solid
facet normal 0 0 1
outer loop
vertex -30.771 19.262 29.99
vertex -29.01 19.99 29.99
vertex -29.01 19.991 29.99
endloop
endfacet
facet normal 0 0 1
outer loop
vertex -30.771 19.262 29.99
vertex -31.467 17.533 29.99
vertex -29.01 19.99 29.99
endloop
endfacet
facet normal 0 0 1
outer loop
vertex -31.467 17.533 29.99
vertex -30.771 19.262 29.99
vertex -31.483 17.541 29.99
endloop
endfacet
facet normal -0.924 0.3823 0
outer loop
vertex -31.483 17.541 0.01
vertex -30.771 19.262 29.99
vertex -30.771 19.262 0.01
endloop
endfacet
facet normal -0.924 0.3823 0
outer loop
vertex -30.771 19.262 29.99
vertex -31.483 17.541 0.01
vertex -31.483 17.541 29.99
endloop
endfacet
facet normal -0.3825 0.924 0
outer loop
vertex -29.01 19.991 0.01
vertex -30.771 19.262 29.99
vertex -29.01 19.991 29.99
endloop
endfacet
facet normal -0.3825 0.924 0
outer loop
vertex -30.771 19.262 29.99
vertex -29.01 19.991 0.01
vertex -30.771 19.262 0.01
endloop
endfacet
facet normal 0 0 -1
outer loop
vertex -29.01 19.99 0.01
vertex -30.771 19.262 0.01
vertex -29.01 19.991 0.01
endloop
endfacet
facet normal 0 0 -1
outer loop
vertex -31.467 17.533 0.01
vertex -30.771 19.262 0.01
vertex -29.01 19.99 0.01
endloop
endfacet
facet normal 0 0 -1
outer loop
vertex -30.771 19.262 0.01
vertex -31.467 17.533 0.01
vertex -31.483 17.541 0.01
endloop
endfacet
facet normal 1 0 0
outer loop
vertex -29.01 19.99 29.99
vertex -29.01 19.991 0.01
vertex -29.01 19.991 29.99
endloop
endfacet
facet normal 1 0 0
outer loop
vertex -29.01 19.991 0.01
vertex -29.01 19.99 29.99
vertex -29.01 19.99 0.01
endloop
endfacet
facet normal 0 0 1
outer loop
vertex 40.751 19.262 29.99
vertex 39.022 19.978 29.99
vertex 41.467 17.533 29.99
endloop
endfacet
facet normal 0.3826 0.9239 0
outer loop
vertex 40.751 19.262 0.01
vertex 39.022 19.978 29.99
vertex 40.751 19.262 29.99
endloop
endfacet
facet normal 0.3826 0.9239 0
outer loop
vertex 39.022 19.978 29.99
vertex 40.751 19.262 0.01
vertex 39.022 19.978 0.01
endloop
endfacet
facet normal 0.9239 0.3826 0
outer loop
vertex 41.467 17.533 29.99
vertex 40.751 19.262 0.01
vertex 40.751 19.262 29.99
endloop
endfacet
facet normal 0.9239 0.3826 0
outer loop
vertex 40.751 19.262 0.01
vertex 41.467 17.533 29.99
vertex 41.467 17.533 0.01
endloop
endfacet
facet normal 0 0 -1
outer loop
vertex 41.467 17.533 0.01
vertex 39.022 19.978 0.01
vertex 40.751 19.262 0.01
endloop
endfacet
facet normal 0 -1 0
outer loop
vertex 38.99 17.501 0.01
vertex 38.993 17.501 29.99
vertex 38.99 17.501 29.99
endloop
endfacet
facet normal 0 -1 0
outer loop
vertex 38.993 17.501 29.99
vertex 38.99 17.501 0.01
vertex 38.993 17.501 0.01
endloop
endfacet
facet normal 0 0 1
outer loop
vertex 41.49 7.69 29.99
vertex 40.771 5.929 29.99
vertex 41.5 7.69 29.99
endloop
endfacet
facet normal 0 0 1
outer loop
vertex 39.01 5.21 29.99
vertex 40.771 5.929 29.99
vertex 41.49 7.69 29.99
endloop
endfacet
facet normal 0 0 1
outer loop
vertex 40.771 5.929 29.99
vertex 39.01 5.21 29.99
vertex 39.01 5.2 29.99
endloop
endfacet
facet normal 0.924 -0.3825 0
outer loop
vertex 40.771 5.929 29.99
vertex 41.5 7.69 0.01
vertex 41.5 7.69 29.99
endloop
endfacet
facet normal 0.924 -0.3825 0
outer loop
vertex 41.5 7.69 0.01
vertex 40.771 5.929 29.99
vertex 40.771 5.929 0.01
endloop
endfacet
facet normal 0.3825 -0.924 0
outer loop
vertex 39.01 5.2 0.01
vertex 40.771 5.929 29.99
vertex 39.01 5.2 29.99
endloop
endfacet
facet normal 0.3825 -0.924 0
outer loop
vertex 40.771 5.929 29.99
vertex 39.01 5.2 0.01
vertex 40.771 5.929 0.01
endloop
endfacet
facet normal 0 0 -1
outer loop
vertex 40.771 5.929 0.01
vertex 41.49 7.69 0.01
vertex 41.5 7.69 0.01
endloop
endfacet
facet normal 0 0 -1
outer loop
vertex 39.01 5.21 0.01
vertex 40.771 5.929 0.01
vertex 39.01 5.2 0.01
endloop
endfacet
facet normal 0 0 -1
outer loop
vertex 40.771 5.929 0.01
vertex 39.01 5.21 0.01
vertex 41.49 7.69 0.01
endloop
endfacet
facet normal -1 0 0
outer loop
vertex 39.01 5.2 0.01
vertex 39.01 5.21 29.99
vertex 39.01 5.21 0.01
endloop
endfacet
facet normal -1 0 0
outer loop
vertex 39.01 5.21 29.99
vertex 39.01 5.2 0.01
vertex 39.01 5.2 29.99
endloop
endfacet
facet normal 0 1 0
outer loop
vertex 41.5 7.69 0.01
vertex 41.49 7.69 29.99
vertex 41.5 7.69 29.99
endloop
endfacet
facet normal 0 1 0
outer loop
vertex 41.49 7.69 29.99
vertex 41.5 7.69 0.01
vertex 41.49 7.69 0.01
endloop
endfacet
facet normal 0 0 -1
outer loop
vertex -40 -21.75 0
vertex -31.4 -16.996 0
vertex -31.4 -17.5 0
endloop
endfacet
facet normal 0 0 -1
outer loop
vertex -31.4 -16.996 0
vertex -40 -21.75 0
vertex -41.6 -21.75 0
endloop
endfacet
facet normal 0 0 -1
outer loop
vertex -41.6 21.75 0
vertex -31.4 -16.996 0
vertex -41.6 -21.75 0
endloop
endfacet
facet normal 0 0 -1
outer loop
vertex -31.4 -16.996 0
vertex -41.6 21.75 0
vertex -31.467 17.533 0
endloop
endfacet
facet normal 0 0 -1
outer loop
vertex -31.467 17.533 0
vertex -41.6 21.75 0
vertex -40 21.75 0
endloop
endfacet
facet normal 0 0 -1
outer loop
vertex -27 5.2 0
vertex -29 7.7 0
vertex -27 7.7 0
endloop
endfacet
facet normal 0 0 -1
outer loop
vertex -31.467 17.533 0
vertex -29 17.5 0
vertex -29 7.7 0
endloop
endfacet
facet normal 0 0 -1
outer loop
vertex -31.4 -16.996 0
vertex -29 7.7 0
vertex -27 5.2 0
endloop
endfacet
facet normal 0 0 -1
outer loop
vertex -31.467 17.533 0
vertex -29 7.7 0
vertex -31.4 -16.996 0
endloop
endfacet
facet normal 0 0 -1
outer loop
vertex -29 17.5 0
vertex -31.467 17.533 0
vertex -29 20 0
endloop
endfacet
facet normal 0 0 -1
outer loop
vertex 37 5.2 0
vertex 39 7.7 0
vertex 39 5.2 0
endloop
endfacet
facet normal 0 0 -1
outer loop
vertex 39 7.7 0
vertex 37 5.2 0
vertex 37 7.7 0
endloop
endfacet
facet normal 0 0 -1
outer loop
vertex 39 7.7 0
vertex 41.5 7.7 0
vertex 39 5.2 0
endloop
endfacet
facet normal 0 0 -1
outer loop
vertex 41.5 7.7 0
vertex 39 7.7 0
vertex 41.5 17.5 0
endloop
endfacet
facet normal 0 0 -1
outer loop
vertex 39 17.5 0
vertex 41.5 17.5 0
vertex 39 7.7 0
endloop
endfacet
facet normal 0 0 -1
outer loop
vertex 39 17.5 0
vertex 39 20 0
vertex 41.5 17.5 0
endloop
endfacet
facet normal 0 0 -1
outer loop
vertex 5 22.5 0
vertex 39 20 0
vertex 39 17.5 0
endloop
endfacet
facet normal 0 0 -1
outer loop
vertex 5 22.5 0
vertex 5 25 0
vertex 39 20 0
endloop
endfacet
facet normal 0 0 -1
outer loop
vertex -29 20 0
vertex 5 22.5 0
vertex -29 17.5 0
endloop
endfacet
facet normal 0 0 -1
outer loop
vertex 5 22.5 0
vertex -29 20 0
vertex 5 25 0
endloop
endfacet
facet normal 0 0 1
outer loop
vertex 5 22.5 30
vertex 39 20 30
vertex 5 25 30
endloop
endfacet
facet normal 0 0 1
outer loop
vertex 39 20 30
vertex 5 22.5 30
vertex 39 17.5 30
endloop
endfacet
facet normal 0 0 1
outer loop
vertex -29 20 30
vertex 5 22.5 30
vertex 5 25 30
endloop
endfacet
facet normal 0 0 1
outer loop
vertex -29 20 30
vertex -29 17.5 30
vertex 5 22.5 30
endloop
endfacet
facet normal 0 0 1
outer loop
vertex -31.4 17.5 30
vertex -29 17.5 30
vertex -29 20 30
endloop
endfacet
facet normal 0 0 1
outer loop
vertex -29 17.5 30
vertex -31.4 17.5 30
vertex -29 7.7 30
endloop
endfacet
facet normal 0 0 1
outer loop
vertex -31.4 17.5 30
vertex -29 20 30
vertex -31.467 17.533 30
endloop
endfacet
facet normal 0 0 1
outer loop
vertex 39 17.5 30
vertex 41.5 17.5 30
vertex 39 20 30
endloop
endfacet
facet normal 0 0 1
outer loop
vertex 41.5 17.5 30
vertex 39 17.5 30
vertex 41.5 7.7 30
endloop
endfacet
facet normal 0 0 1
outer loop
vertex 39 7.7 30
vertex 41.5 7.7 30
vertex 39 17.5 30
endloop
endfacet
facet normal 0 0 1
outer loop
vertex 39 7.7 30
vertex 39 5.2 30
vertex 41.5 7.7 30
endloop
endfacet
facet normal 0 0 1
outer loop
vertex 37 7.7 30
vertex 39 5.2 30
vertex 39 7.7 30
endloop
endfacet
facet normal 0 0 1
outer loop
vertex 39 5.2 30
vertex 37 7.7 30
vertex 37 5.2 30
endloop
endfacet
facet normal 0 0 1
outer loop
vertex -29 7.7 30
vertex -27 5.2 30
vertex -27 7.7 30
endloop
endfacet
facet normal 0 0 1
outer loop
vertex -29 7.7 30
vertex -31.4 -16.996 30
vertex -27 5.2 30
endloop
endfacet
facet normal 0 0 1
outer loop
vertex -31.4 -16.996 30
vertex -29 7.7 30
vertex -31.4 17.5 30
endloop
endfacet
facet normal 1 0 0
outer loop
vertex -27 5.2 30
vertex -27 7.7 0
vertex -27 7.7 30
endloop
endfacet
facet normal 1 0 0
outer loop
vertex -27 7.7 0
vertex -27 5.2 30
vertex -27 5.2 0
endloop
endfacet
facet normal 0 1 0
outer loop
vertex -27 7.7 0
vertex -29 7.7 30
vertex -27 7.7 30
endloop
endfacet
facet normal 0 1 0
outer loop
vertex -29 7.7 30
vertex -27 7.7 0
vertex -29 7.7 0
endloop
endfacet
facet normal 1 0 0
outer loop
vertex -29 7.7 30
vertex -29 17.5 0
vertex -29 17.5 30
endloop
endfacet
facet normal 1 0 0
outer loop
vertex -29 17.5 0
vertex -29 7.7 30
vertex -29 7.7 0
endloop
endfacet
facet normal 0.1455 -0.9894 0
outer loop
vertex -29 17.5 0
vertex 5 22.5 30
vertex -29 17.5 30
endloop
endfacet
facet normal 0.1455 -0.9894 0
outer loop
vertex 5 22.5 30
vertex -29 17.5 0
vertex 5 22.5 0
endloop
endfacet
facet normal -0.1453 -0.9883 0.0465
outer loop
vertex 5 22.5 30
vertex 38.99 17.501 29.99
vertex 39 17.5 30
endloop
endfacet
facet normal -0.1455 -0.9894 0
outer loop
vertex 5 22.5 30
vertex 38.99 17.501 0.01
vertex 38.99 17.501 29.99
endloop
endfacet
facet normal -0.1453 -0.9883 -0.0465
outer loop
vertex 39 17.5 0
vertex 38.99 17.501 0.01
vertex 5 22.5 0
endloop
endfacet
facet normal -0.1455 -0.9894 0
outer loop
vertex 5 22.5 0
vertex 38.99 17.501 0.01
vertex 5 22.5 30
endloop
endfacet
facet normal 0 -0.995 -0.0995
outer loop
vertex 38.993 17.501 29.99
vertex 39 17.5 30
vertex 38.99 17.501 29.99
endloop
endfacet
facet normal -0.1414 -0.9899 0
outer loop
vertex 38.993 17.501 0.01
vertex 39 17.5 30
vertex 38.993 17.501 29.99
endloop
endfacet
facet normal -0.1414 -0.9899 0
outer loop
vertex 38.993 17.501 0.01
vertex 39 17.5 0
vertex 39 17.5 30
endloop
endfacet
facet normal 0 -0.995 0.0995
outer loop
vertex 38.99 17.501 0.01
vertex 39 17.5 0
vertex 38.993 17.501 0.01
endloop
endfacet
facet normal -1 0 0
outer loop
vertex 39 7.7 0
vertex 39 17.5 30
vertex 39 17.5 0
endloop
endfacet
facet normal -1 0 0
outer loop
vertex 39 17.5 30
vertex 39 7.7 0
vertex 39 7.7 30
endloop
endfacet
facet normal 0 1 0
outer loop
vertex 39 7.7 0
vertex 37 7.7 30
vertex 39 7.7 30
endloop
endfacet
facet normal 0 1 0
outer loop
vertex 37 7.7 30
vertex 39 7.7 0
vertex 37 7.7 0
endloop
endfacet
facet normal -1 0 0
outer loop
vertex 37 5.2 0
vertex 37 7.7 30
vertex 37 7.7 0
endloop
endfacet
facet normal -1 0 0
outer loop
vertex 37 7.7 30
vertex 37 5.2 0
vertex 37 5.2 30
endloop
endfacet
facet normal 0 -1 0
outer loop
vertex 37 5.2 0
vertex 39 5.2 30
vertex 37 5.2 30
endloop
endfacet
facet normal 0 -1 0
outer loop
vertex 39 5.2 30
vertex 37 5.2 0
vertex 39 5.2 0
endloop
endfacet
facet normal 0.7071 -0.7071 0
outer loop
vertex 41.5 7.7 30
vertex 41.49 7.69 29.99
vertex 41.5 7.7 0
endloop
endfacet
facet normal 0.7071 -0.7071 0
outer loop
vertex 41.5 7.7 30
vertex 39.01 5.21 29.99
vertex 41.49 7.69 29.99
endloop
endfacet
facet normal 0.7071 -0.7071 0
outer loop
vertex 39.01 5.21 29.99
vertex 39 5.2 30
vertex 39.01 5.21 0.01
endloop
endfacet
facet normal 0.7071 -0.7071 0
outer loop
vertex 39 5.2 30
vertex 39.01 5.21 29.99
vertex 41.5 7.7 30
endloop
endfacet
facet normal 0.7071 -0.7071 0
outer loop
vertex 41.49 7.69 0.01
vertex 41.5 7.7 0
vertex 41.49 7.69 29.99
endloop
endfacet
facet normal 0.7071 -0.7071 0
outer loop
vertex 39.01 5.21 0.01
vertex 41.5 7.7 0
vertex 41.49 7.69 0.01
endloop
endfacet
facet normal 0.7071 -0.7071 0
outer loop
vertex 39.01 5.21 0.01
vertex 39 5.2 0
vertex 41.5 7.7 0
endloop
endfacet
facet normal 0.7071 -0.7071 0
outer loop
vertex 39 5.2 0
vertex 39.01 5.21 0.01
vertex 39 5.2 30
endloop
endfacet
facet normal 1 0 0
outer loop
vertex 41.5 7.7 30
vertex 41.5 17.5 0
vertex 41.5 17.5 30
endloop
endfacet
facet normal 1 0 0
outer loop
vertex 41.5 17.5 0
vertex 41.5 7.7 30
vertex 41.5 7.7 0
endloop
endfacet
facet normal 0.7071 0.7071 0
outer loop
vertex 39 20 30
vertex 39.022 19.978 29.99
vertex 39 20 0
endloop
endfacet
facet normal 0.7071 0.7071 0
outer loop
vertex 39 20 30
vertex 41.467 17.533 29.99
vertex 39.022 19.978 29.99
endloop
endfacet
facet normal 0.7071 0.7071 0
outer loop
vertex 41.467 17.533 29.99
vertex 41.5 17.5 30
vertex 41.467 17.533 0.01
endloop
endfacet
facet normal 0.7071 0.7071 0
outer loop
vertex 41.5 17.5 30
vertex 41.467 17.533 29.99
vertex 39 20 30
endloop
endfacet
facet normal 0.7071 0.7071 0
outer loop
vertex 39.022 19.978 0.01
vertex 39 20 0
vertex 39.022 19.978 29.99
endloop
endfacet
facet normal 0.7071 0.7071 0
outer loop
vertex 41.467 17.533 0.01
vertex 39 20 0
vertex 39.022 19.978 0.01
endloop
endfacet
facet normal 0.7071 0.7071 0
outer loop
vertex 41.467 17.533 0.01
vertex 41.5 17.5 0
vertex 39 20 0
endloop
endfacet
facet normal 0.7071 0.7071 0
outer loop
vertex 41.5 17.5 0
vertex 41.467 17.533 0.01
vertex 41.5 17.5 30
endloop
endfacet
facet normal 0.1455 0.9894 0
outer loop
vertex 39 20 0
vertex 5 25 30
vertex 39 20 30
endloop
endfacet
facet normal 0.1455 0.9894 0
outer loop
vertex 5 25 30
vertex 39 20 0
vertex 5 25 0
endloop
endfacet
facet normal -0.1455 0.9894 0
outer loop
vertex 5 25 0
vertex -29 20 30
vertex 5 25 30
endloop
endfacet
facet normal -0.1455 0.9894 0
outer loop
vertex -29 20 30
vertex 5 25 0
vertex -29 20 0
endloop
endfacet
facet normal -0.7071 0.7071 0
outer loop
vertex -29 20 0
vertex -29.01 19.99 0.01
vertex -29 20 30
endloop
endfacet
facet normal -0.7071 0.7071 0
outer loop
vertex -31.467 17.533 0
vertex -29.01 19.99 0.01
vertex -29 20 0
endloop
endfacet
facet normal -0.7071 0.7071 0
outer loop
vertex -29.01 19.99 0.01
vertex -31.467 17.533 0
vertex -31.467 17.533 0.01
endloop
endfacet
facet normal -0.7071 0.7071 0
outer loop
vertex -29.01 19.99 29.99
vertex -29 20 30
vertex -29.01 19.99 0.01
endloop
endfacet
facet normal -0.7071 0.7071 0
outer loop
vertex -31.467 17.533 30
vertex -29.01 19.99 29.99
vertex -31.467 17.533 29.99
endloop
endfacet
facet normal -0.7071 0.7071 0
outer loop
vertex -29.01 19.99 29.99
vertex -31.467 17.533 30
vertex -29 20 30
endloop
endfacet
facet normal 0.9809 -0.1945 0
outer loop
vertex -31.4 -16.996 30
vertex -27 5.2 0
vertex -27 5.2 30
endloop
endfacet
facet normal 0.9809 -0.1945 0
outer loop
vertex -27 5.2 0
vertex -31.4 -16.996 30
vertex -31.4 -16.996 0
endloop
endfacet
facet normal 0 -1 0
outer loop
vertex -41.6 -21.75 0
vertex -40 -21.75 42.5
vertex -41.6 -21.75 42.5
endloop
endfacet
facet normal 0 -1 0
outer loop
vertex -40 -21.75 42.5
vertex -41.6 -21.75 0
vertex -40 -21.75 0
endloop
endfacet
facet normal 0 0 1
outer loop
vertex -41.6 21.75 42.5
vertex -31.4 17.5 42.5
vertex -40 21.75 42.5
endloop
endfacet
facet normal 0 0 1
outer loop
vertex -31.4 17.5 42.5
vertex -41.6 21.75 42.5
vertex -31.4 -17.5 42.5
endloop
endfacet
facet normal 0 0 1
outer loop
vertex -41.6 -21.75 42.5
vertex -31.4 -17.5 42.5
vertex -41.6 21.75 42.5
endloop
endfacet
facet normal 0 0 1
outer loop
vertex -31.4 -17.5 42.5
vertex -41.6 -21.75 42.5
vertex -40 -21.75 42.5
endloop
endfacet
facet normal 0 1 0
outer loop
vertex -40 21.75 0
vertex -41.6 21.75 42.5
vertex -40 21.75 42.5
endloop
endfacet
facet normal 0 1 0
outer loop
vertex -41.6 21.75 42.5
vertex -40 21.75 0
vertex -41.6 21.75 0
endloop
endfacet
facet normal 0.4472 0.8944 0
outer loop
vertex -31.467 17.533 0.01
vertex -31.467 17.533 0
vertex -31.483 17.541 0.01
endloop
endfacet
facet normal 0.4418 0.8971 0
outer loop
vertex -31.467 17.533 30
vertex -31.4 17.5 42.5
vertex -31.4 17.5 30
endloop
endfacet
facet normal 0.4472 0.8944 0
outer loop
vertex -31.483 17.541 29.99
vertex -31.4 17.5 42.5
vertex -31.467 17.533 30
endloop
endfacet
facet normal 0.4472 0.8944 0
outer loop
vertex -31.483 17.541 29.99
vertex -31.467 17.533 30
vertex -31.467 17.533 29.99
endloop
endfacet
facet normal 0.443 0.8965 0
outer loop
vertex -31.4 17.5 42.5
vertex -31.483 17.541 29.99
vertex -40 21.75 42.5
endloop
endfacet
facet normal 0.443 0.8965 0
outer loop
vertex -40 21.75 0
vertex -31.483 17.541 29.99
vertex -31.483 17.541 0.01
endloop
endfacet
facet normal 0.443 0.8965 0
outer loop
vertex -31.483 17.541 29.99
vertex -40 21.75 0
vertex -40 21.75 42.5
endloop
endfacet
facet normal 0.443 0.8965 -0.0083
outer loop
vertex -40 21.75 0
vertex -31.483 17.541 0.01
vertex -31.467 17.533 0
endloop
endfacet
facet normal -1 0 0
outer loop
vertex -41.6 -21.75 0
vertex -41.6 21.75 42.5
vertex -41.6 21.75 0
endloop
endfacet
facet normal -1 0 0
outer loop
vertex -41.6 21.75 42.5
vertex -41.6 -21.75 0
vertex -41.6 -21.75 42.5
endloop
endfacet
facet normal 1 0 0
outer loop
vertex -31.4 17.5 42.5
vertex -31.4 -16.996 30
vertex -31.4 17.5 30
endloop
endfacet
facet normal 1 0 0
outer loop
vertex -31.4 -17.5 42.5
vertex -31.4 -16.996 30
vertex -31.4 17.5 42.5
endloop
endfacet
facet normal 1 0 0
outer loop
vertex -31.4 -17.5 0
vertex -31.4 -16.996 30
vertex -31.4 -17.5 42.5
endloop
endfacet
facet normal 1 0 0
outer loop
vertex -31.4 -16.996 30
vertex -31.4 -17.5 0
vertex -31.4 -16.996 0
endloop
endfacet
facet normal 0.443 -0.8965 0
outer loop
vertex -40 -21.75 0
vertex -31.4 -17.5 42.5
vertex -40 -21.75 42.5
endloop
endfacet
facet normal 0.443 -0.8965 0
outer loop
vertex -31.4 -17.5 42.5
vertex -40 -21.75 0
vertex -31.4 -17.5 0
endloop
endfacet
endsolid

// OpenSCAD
phone_width = 68;
phone_depth = 9.8;
phone_clamp_width = 30;

clamp_lip = 2;
spring_deflection = 5;

clamp_meat = 2.5;

mount_base_length = 43.5;
mount_base_height = 1.6;
mount_slant_length = 35;
mount_slant_height = 8.6;
mount_width = 42.5;

//[Hidden]
// formulas
slant = (mount_base_length - mount_slant_length) / 2;
totalHeight = mount_base_height + mount_slant_height;
centerX = -mount_base_length/2;
centerY = (totalHeight+phone_width+(clamp_meat*2))/-2;

rotate([0, 0, -90]) {
	translate([centerX, centerY, 0]) {
		print();
	}
}


// Modules
module print() {
	union() {
		translate([slant, totalHeight - 0.1, 0]) {
			clamp();
		}
		base();
	}
}

module base() {
	linear_extrude(height = mount_width) {
		polygon([[0, 0], [0, mount_base_height], [slant, totalHeight], [slant + mount_slant_length, totalHeight], [mount_base_length, mount_base_height], [mount_base_length, 0]]);
	}
}

module clamp() {
	union() {
		linear_extrude(height = phone_clamp_width) {
			polygon([[0, 0], [-clamp_meat, clamp_meat], [-clamp_meat-spring_deflection, (phone_width / 2) + clamp_meat], [-clamp_meat, phone_width + clamp_meat], [0, phone_width + clamp_meat*2], [phone_depth + clamp_meat, phone_width + clamp_meat*2], [phone_depth, phone_width + clamp_meat*2], [phone_depth + clamp_meat, phone_width + clamp_meat], [phone_depth + clamp_meat, phone_width + clamp_meat - clamp_lip], [phone_depth, phone_width + clamp_meat - clamp_lip], [phone_depth, phone_width + clamp_meat], [0, phone_width + clamp_meat], [-spring_deflection, (phone_width / 2) + clamp_meat], [0, clamp_meat], [phone_depth, clamp_meat], [phone_depth, clamp_meat + clamp_lip], [phone_depth + clamp_meat, clamp_meat + clamp_lip], [mount_slant_length ,0]]);
		}
		translate([-0.001, clamp_meat -0.01, 0.01]) {
			rotate([0,0,0]) {
				roundedCorner(clamp_meat - 0.01, phone_clamp_width - 0.02);
			}
		}
		translate([-0.001, phone_width + clamp_meat -0.01, 0.01]) {
			rotate([0, 0, 270]) {
				roundedCorner(clamp_meat - 0.01, phone_clamp_width - 0.02);
			}
		}
		translate([phone_depth + 0.01, phone_width + clamp_meat + 0.01, 0.01]) {
			rotate([0, 0, 180]) {
				roundedCorner(clamp_meat - 0.01, phone_clamp_width - 0.02);
			}
		}
	}
}

module roundedCorner(radius, height) {
	intersection() {
		linear_extrude(height = height) {
			circle(radius);
		}
		translate([-radius, -radius,-0.01]) {
			linear_extrude(height = height + 0.02) {
				square([radius, radius], center=false);
			}
		}
	}
}
